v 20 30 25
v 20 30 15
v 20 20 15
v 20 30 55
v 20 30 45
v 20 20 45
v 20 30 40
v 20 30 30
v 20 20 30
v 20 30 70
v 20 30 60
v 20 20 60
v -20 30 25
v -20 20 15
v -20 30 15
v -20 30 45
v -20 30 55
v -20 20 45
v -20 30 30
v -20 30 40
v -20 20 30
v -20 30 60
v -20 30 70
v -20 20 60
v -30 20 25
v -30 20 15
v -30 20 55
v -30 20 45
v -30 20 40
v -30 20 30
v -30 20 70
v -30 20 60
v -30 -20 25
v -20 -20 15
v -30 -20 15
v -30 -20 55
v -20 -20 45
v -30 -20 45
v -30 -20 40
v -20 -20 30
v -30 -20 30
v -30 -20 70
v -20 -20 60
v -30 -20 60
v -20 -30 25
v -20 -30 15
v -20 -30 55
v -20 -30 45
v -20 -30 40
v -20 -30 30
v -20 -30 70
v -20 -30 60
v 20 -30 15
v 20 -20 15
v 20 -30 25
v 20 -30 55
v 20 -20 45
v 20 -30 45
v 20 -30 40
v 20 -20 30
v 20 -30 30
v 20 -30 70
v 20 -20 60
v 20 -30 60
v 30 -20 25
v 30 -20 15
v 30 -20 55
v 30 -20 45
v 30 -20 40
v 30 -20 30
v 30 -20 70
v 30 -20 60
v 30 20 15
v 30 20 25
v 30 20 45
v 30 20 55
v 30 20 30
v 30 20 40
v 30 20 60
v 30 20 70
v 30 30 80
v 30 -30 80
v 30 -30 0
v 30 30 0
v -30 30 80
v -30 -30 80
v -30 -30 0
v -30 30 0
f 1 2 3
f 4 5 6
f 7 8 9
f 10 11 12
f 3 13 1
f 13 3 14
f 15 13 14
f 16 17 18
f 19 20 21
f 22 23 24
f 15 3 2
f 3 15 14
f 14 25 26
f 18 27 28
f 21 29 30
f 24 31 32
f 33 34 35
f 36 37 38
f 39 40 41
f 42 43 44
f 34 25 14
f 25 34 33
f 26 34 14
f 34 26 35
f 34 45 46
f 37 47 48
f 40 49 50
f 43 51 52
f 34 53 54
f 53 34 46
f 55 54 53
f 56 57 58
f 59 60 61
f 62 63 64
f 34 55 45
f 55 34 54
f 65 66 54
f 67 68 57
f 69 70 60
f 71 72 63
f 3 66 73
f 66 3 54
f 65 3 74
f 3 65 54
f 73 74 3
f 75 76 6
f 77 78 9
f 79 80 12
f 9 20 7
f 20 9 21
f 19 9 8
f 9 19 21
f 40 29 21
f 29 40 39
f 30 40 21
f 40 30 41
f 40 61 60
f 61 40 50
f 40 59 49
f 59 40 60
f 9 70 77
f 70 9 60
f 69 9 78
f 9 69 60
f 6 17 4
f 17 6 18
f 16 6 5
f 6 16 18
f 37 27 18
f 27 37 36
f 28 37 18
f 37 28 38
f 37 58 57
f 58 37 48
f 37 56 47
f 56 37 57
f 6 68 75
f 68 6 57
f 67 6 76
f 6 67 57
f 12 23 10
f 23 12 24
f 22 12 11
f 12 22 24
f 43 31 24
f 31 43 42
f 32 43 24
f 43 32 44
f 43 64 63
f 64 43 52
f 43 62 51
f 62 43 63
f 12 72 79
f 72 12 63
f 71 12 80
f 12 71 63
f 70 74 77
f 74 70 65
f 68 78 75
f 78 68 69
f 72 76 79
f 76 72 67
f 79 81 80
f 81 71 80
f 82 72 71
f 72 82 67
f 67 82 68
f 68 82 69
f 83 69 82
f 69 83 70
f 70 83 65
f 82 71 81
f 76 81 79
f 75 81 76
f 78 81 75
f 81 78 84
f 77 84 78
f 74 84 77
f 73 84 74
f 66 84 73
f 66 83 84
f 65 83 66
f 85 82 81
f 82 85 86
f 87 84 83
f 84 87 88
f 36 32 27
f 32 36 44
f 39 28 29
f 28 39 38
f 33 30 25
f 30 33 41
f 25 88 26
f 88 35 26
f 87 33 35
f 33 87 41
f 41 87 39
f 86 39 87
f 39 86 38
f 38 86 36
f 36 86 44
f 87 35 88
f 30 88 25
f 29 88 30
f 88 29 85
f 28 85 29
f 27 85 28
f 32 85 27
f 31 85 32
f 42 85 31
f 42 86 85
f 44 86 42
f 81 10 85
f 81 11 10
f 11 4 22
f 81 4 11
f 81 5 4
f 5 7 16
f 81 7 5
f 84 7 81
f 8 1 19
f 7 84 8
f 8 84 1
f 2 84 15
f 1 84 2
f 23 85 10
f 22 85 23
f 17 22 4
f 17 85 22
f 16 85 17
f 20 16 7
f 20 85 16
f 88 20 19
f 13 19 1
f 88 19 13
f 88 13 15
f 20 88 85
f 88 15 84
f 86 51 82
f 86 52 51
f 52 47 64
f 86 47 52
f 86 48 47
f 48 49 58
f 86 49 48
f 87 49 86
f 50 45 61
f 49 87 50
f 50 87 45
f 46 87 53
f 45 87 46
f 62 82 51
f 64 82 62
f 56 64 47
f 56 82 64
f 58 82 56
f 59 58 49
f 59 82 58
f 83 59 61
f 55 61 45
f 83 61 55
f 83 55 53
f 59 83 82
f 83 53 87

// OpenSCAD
height = 80;
side = 60;
edge_width = 20;
hole_side = side - edge_width;

translate([0, 0, height/2])
difference() {
cube([side, side, height], true);

for(j = [1 : 4]) {
  translate([0, 0, (-height/2) + 15 * j])
  for(i = [0 : 3]) {
    rotate([90*i, 270, 0])
    translate([0, 20, -hole_side/2])
    linear_extrude(hole_side, false) {
      polygon(points=[[0, 0], [0, 100], [100, 100]]);
    }
  }
}

}
